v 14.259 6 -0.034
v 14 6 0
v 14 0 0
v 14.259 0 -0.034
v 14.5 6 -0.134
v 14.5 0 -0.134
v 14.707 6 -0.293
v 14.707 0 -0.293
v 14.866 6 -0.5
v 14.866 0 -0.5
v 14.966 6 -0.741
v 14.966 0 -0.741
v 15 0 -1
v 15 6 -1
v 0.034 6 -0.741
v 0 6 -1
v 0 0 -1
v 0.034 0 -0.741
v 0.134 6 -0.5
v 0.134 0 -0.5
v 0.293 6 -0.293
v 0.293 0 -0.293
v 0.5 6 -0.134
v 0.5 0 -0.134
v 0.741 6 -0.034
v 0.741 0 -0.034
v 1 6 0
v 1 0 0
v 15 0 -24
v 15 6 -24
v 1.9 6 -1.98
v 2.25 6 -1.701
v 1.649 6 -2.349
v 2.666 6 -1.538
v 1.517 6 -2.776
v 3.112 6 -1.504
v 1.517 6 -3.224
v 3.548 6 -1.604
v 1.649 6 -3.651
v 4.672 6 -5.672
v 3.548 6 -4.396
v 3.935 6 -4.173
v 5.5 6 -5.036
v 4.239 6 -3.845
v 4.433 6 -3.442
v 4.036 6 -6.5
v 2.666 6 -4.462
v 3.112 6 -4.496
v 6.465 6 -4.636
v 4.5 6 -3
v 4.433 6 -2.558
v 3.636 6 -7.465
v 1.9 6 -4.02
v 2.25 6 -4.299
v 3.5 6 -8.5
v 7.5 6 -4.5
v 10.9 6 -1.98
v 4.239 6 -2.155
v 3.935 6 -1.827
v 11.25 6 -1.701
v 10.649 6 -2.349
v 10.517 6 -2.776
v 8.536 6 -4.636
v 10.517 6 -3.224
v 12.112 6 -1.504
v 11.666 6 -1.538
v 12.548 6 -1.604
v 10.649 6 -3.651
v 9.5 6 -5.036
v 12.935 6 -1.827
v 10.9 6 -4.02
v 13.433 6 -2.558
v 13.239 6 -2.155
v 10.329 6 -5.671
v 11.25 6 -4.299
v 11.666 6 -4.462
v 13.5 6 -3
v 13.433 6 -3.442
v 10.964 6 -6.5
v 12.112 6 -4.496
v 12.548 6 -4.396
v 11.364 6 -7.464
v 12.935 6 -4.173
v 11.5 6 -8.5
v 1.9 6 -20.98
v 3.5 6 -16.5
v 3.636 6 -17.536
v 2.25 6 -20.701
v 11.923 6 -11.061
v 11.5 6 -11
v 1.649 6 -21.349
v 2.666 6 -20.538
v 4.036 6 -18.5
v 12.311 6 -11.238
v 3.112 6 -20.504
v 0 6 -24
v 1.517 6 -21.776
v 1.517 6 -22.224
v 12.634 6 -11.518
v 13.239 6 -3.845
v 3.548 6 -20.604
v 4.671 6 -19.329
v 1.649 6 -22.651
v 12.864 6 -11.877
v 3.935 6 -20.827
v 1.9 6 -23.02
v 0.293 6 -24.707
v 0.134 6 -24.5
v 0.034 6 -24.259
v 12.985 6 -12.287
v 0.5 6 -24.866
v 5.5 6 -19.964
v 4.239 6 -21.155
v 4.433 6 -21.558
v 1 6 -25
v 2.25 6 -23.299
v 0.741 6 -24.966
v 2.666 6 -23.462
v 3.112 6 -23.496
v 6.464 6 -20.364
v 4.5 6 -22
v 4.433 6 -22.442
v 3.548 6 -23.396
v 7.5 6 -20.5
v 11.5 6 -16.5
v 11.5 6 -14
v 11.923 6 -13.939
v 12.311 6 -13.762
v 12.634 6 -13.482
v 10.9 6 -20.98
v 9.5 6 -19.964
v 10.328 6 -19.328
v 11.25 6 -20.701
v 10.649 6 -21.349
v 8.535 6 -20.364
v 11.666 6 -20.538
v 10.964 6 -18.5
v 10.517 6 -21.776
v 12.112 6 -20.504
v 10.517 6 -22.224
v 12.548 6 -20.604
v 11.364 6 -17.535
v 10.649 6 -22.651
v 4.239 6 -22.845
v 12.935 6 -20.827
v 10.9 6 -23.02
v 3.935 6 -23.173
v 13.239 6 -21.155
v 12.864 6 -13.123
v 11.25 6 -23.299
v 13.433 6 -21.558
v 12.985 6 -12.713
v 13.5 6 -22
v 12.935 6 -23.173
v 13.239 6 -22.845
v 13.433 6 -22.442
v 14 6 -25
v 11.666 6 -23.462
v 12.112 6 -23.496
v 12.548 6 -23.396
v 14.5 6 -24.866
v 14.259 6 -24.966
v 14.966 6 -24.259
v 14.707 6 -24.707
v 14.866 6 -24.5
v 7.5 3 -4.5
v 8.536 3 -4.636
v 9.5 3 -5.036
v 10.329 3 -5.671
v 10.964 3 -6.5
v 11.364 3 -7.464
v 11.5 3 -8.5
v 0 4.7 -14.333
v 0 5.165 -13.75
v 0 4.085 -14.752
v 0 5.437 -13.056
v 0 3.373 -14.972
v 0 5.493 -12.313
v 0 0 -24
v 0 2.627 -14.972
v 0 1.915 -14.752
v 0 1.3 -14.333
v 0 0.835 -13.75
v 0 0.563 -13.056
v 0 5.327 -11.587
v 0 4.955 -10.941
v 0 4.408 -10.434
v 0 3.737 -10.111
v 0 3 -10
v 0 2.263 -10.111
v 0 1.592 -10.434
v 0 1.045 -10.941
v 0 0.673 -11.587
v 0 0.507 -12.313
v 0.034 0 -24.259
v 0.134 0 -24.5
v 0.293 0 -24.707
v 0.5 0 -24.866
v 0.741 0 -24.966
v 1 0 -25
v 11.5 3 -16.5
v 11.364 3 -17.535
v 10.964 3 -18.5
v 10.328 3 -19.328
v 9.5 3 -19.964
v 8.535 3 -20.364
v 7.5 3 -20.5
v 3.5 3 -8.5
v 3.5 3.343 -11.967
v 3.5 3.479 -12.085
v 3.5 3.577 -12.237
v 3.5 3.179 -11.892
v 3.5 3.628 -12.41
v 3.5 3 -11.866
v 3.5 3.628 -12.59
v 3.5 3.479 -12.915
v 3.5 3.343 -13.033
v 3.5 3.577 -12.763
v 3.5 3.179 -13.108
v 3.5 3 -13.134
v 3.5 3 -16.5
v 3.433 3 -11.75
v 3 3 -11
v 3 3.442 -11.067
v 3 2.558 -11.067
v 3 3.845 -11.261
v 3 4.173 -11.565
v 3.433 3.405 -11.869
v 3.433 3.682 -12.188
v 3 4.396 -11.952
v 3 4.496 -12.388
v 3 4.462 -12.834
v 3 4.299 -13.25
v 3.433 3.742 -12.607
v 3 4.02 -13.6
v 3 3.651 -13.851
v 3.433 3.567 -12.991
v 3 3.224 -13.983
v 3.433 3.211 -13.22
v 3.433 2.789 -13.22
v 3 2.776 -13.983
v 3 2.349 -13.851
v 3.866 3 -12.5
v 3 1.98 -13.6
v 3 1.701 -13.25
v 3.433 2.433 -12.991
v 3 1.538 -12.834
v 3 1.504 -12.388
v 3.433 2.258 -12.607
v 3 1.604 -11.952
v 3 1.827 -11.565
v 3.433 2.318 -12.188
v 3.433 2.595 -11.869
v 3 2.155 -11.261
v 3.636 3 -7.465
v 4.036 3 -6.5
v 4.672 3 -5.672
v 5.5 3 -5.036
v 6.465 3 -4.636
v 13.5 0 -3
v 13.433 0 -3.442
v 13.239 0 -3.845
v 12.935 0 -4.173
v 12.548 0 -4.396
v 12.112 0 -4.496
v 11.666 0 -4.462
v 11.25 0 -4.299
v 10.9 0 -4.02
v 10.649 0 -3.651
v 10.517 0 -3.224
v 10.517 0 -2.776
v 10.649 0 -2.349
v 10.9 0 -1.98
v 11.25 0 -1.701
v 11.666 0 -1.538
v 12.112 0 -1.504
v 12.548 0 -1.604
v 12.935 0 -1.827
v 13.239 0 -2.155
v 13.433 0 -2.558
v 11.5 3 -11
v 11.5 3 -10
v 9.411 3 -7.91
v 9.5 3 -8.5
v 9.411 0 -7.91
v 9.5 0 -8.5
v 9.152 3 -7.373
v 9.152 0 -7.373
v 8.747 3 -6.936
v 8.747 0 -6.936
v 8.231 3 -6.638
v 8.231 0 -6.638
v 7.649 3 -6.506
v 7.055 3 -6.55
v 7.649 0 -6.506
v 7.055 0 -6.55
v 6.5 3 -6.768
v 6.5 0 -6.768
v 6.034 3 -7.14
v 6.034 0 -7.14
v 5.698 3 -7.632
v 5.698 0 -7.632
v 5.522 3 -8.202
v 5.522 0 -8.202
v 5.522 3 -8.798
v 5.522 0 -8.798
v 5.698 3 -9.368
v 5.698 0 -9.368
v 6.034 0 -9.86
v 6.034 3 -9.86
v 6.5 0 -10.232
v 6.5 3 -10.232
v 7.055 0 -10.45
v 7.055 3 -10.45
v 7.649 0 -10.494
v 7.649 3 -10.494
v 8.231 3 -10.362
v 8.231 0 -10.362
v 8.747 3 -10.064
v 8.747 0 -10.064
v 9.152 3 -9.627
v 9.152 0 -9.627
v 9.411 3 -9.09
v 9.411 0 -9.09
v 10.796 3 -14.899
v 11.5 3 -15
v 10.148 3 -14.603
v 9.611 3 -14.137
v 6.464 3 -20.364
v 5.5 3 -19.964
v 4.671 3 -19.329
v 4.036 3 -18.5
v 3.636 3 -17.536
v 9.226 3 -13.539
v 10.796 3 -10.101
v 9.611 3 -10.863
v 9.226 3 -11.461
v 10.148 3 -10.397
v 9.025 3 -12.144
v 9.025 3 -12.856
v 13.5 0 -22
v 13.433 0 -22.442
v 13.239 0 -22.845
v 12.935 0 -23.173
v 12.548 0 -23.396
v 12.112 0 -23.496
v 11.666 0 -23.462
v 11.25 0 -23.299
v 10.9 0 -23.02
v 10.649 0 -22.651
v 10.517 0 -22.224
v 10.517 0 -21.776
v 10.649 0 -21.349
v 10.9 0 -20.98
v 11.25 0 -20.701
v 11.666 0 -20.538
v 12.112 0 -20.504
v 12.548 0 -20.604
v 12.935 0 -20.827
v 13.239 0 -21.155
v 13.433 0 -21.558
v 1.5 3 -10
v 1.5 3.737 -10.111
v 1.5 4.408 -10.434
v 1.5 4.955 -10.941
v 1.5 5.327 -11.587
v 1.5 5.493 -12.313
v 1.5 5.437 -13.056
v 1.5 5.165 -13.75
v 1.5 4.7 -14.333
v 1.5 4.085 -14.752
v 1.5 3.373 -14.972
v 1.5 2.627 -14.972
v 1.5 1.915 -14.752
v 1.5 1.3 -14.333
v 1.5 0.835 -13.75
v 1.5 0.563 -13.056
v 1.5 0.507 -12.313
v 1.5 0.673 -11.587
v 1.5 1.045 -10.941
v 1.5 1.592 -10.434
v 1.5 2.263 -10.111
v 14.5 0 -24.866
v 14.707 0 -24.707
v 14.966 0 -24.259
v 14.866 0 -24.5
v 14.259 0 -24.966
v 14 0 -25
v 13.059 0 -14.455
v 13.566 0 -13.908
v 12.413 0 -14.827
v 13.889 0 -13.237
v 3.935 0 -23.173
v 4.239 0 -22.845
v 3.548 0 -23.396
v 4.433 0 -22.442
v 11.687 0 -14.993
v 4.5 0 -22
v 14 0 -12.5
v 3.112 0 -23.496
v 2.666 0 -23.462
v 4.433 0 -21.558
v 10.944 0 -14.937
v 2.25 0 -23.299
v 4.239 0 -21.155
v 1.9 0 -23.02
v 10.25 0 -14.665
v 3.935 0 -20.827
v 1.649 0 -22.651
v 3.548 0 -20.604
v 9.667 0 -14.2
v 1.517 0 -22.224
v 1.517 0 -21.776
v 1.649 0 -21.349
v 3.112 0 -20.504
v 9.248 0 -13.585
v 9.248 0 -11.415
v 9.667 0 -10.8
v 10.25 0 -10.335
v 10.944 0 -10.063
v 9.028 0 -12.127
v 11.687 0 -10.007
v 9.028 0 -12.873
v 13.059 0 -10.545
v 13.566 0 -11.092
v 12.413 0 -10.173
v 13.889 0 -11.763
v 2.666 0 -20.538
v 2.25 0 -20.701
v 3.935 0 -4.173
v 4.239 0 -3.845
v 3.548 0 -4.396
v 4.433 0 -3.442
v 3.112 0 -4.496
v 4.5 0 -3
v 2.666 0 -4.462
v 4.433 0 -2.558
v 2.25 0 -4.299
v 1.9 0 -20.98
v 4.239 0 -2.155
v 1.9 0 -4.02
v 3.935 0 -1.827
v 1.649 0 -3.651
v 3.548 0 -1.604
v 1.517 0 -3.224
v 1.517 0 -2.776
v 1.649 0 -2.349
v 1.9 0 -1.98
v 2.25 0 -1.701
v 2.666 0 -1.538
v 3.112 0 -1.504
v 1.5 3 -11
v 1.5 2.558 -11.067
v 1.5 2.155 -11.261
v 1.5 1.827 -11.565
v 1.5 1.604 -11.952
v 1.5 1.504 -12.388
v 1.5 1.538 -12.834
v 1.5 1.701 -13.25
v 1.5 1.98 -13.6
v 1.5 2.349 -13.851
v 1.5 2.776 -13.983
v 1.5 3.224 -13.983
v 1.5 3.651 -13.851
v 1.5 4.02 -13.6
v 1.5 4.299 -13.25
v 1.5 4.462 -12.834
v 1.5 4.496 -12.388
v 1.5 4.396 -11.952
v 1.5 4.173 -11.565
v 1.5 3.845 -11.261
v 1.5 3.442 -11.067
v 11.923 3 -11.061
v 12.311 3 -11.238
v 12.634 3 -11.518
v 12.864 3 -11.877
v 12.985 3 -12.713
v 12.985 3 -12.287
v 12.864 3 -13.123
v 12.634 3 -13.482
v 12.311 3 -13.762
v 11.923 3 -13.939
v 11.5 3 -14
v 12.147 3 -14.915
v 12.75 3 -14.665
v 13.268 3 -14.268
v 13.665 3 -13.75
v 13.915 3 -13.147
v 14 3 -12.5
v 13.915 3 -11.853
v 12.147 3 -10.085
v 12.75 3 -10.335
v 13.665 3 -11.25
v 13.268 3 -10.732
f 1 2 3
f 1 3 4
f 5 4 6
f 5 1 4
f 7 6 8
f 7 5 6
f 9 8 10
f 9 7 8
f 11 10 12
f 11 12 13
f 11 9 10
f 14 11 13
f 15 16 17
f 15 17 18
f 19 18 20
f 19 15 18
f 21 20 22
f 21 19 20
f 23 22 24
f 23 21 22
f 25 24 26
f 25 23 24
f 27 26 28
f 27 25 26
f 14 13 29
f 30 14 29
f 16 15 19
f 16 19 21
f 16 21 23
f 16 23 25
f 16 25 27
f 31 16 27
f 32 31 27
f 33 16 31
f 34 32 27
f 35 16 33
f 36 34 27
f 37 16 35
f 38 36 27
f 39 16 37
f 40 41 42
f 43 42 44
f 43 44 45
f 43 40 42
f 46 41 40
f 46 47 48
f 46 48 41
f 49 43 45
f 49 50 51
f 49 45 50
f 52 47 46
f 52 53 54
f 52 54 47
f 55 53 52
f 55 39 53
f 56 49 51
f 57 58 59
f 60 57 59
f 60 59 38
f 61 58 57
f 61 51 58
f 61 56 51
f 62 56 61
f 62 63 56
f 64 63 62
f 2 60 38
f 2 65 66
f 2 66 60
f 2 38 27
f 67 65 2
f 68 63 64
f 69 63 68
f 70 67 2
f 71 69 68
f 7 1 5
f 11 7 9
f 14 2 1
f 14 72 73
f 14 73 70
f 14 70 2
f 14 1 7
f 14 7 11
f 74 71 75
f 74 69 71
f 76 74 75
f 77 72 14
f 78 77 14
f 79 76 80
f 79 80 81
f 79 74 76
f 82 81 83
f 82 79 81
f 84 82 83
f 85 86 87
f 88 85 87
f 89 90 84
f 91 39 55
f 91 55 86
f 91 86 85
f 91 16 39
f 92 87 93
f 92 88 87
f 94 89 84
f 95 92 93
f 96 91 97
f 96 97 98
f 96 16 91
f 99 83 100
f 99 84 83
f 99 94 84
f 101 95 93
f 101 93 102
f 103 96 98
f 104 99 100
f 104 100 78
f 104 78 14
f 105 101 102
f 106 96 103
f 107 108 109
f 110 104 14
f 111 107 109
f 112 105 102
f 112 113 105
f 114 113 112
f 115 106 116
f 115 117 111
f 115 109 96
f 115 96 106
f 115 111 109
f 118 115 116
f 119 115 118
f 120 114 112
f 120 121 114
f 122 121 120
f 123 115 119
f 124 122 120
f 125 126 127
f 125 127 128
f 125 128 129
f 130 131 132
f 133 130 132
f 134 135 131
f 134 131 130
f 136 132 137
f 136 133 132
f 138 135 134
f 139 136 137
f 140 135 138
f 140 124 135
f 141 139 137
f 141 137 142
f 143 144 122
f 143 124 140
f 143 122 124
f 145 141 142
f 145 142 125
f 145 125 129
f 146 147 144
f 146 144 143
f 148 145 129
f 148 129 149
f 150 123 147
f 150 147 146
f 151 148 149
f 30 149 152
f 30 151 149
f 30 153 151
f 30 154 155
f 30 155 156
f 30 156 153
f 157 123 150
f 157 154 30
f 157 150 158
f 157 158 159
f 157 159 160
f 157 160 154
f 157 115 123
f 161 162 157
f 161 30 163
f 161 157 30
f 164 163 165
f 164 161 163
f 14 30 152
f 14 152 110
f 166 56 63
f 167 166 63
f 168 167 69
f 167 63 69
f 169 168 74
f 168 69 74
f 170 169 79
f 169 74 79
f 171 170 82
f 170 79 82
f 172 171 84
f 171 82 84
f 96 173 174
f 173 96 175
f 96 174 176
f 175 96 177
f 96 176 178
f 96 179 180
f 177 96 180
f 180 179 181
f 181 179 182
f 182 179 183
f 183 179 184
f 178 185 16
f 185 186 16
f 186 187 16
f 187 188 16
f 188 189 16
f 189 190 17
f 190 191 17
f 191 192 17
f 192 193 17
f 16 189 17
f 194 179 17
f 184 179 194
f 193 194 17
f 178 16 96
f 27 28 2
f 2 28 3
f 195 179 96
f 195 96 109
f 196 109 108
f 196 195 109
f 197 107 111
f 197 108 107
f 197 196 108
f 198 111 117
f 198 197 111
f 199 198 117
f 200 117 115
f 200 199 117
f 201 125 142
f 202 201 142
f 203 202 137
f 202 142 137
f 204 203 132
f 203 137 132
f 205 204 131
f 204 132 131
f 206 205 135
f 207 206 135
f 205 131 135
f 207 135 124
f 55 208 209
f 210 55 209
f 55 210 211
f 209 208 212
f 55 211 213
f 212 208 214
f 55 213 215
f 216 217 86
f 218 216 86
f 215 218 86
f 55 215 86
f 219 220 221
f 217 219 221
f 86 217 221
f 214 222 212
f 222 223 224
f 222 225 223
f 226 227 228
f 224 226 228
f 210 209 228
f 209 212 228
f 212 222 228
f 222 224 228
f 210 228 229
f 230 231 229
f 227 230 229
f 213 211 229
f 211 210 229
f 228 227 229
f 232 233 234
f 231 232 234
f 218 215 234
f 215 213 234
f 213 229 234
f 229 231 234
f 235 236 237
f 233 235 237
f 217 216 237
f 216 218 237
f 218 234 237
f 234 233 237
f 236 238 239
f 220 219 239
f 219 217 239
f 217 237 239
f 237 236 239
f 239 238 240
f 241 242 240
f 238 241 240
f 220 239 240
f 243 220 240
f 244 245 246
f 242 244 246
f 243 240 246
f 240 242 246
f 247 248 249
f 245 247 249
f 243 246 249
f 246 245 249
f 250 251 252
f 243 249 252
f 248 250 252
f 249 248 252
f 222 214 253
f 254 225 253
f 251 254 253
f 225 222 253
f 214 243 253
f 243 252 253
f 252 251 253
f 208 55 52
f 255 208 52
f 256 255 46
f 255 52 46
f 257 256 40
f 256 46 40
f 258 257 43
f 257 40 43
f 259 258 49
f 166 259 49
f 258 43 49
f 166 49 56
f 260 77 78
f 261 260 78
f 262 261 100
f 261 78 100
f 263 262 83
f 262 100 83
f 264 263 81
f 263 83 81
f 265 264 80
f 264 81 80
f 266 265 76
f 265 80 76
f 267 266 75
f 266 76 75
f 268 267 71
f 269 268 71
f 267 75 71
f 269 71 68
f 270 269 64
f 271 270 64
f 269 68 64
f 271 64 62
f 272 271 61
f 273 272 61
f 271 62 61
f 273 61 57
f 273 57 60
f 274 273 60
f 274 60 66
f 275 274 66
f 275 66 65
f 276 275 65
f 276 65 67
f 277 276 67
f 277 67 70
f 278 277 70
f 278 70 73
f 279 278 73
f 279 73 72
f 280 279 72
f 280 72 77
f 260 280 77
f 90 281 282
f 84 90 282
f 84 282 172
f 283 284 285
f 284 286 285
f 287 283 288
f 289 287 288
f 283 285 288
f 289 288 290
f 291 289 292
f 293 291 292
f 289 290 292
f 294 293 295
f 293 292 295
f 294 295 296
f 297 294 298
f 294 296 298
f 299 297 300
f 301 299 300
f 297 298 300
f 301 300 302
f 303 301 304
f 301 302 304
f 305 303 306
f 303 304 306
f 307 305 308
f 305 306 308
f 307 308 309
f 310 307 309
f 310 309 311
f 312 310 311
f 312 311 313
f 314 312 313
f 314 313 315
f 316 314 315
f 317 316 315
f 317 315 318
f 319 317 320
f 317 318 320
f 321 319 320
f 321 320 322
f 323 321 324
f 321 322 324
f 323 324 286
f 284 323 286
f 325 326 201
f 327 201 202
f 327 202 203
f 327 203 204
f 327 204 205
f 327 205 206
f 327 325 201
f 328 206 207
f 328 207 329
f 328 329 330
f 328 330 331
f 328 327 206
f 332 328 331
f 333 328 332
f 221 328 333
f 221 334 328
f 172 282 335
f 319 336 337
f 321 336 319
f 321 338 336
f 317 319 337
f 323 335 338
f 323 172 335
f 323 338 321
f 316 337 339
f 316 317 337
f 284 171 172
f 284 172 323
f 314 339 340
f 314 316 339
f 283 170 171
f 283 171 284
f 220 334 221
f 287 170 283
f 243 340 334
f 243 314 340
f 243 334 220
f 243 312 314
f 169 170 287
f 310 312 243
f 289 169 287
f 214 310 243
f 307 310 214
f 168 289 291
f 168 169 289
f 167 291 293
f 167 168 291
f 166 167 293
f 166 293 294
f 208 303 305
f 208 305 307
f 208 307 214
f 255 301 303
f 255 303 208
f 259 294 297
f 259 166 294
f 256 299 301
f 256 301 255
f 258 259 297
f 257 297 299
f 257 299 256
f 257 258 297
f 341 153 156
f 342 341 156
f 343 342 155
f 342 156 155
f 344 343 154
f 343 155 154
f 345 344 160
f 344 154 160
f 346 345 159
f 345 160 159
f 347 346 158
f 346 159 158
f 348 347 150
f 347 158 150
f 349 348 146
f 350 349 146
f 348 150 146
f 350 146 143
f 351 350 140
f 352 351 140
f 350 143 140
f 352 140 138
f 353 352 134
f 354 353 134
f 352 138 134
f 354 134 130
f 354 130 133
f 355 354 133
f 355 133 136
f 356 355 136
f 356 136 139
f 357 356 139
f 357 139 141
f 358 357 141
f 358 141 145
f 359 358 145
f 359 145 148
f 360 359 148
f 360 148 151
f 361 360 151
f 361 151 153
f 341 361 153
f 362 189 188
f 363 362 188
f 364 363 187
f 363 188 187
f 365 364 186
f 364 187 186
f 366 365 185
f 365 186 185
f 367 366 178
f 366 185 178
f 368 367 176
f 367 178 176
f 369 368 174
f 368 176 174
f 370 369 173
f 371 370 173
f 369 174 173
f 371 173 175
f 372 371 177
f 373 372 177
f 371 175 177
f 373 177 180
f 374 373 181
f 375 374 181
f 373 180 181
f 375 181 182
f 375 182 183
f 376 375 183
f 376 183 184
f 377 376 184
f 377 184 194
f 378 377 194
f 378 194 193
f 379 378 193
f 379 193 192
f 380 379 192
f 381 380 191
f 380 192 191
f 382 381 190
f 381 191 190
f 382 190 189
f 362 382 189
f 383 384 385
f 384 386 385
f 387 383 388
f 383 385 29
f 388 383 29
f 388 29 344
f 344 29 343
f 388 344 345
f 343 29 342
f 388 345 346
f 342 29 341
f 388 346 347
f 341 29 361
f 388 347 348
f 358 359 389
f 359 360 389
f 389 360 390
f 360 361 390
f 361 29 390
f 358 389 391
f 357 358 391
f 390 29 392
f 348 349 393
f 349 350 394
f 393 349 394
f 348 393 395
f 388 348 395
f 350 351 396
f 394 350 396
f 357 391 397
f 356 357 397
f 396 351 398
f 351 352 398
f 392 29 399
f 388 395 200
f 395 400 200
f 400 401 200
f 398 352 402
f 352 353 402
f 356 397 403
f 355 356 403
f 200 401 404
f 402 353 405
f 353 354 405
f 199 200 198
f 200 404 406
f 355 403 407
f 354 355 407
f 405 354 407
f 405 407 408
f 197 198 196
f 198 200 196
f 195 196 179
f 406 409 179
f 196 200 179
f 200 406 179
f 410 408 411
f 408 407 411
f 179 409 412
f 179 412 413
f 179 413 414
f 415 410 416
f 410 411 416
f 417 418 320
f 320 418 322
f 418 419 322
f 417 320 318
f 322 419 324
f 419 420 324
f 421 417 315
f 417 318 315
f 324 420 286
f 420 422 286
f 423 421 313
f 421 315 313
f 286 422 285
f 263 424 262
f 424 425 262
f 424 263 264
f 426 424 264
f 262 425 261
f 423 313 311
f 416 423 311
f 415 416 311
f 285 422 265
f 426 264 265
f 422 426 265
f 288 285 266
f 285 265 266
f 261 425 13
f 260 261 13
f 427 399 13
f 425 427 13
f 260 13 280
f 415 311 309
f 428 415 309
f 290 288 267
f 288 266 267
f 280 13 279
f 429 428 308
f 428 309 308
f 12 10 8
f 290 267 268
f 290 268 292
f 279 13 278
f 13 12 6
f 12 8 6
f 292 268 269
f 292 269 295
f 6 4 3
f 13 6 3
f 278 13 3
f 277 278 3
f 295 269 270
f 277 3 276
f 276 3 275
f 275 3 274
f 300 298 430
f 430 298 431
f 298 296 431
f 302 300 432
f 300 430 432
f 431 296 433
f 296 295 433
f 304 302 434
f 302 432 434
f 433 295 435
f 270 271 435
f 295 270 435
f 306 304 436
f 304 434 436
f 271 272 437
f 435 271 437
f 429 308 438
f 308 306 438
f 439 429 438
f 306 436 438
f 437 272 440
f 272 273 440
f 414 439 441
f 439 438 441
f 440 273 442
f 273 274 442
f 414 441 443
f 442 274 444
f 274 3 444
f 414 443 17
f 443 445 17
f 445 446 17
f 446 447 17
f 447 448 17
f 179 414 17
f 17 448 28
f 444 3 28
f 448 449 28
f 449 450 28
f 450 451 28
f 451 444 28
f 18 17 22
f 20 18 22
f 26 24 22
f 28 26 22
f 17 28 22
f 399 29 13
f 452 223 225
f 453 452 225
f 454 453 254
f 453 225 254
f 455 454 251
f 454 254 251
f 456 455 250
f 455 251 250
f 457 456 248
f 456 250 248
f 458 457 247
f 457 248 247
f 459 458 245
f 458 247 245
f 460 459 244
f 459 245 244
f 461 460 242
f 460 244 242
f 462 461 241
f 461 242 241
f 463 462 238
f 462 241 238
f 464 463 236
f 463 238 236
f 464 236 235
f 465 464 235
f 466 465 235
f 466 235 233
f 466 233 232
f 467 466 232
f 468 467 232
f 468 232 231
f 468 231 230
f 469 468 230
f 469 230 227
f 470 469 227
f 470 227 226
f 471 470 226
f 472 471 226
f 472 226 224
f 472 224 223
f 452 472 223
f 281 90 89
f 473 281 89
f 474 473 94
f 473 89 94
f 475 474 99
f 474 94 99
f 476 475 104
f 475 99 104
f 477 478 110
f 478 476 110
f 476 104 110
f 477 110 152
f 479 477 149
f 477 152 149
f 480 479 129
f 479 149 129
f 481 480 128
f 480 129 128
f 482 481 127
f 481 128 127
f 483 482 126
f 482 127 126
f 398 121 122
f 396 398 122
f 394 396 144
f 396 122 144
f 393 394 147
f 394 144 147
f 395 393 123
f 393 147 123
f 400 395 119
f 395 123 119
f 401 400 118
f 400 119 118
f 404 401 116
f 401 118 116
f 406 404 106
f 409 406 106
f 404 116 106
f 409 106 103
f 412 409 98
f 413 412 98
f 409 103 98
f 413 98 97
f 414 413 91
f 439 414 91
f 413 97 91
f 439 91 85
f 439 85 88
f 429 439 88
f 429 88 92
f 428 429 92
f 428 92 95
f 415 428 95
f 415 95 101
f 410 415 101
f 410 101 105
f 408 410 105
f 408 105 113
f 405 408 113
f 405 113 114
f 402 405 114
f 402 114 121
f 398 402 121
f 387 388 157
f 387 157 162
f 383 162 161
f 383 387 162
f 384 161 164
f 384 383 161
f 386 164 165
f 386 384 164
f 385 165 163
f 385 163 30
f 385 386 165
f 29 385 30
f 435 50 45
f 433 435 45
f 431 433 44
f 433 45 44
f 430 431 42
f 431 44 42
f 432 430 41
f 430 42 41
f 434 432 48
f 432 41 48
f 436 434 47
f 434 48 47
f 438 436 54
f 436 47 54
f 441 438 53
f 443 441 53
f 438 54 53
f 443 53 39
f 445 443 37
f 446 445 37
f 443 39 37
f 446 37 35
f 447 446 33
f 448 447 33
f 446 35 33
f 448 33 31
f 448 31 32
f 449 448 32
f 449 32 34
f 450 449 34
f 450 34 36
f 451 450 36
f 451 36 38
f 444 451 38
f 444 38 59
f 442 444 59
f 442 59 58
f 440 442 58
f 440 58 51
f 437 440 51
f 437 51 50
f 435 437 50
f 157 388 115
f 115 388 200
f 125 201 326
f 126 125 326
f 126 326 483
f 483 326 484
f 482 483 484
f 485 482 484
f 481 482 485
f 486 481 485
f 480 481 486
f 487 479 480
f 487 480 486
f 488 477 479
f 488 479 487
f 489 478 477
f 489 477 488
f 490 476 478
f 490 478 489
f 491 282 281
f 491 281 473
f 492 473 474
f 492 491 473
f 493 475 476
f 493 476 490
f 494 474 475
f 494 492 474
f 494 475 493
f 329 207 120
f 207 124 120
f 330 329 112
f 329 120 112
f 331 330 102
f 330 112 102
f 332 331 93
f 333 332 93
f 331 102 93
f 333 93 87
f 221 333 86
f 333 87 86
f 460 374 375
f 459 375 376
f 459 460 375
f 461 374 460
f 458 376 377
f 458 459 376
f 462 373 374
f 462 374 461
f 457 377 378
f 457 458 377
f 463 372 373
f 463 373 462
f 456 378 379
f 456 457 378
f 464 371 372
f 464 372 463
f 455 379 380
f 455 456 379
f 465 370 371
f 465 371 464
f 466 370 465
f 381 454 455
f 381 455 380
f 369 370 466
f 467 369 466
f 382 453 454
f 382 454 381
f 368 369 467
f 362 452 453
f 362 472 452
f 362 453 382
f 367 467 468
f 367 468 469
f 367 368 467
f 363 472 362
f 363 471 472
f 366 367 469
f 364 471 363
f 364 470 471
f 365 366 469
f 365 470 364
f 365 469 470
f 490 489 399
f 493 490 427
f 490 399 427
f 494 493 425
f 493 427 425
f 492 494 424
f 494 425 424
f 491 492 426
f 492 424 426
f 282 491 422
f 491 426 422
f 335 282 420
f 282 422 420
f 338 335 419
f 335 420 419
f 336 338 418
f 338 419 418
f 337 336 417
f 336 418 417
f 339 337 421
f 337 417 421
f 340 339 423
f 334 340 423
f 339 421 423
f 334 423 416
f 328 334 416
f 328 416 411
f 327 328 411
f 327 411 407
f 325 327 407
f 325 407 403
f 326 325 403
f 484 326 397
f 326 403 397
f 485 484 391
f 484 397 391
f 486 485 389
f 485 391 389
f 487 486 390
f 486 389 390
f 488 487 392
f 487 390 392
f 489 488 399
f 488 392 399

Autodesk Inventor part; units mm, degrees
ref_plane "YZ Plane" through (0, 0, 0) normal (1, 0, 0) x (0, 1, 0)
ref_plane "XZ Plane" through (0, 0, 0) normal (0, 1, 0) x (-1, 0, 0)
ref_plane "XY Plane" through (0, 0, 0) normal (0, 0, 1) x (1, 0, 0)
sketch "Szkic1" plane through (0, 0, 0) normal (0, 1, 0) x (-1, 0, 0)
  line L0 (0, 0) -> (-15, 0)
  line L1 (-15, 0) -> (-15, -25)
  line L2 (-15, -25) -> (0, -25)
  line L3 (0, -25) -> (0, 0)
  dimension "d0" = 15
  dimension "d1" = 25
extrude "Wyciągnięcie proste1" add sketch "Szkic1" along normal blind 3
sketch "Szkic2" plane through (0, 3, 0) normal (0, 1, 0) x (1, 0, 0)
  line L0 (0, 25) -> (0, 0) projected
  line L1 (0, 0) -> (15, 0) projected
  line L2 (0, 0) -> (15, 0)
  line L3 (15, 0) -> (15, 25) projected
  line L4 (15, 0) -> (15, 25)
  line L5 (15, 25) -> (0, 25)
  line L6 (0, 25) -> (0, 0)
  line L7 (3.5, 4.5) -> (3.5, 20.5)
  line L8 (3.5, 20.5) -> (11.5, 20.5)
  line L9 (11.5, 20.5) -> (11.5, 4.5)
  line L10 (11.5, 4.5) -> (3.5, 4.5)
  dimension "d4" = 16
  dimension "d5" = 8
  dimension "d6" = 16
extrude "Wyciągnięcie proste2" add sketch "Szkic2" along normal blind 3
fillet "Zaokrąglenie1" radius 4 1 edges at (11.5, 4.5, -20.5)
fillet "Zaokrąglenie2" radius 4 1 edges at (3.5, 4.5, -20.5)
fillet "Zaokrąglenie3" radius 4 1 edges at (3.5, 4.5, -4.5)
fillet "Zaokrąglenie4" radius 4 1 edges at (11.5, 4.5, -4.5)
fillet "Zaokrąglenie5" radius 1 1 edges at (15, 3, -25)
fillet "Zaokrąglenie6" radius 1 1 edges at (0, 3, -25)
fillet "Zaokrąglenie7" radius 1 1 edges at (0, 3, 0)
fillet "Zaokrąglenie8" radius 1 1 edges at (15, 3, 0)
sketch "Szkic3" plane through (0, 6, 0) normal (0, 1, 0) x (1, 0, 0)
  line L0 (3, 3) -> (3, 22)
  line L1 (3, 22) -> (12, 22)
  line L2 (12, 22) -> (12, 3)
  line L3 (12, 3) -> (3, 3)
  circle A0 centre (3, 3) radius 1.5
  circle A1 centre (12, 3) radius 1.5
  circle A2 centre (12, 22) radius 1.5
  circle A3 centre (3, 22) radius 1.5
  point P0 (0, 0)
  dimension "d17" = 19
  dimension "d18" = 9
  dimension "d19" = 19
  dimension "d20" = 3
  dimension "d21" = 3
  dimension "d22" = 3
  dimension "d23" = 3
extrude "Wyciągnięcie proste3" cut sketch "Szkic3" against normal blind 6 contours L3 A0 L0 | L0 A0 L3 | A3 L1 L0 | L0 L1 A3 | A1 L2 L3 | L3 L2 A1 | A2 L2 L1 | L1 L2 A2
sketch "Szkic6" plane through (0, 0, 0) normal (0, -1, 0) x (1, 0, 0)
  circle A0 centre (11.5, -12.5) radius 2.5
  point P0 (0, 0)
  dimension "d27" = 5
extrude "Wyciągnięcie proste4" cut sketch "Szkic6" against normal blind 3
sketch "Szkic7" plane through (0, 6, 0) normal (0, 1, 0) x (1, 0, 0)
  line L0 (11.5, 16.5) -> (11.5, 8.5) projected
  circle A0 centre (11.5, 12.5) radius 1.5
  point P0 (0, 0)
  point P1 (11.5, 14)
  point P2 (11.5, 11)
  dimension "d30" = 3
extrude "Wyciągnięcie proste5" cut sketch "Szkic7" against normal blind 3 contours A0 L0 picked at (11.9875, 12.6113)
sketch "Szkic8" plane through (0, 0, 0) normal (0, -1, 0) x (1, 0, 0)
  circle A0 centre (7.5, -8.5) radius 2
  point P0 (0, 0)
  dimension "d33" = 4
extrude "Wyciągnięcie proste6" cut sketch "Szkic8" against normal blind 3
sketch "Szkic11" plane through (0, 0, -24) normal (-1, 0, 0) x (0, 0, 1)
  line L0 (24, 6) -> (24, 0) projected
  line L1 (24, 3) -> (-1, 3)
  line L2 (-1, 6) -> (-1, 0) projected
  line L3 (7.5, 3) -> (15.5, 3) projected
  line L4 (11.5, 3) -> (11.5, 6)
  line L5 (10, 6) -> (13, 6) projected
  line L6 (11.5, 3) -> (11.5, 0)
hole "Otwór1" at (0, 3, -12.5) direction (1, 0, 0) diameter 3 depth 3 tip angle 120
sketch "Szkic13" plane through (0, 0, -24) normal (-1, 0, 0) x (0, 0, 1)
  line L0 (9, 3) -> (14, 3) projected
  circle A0 centre (11.5, 3) radius 2.5
  line L1 (14, 0) -> (14, 3) projected
  point P0 (24, 0)
extrude "Wyciągnięcie proste7" cut sketch "Szkic13" against normal blind 1.5
